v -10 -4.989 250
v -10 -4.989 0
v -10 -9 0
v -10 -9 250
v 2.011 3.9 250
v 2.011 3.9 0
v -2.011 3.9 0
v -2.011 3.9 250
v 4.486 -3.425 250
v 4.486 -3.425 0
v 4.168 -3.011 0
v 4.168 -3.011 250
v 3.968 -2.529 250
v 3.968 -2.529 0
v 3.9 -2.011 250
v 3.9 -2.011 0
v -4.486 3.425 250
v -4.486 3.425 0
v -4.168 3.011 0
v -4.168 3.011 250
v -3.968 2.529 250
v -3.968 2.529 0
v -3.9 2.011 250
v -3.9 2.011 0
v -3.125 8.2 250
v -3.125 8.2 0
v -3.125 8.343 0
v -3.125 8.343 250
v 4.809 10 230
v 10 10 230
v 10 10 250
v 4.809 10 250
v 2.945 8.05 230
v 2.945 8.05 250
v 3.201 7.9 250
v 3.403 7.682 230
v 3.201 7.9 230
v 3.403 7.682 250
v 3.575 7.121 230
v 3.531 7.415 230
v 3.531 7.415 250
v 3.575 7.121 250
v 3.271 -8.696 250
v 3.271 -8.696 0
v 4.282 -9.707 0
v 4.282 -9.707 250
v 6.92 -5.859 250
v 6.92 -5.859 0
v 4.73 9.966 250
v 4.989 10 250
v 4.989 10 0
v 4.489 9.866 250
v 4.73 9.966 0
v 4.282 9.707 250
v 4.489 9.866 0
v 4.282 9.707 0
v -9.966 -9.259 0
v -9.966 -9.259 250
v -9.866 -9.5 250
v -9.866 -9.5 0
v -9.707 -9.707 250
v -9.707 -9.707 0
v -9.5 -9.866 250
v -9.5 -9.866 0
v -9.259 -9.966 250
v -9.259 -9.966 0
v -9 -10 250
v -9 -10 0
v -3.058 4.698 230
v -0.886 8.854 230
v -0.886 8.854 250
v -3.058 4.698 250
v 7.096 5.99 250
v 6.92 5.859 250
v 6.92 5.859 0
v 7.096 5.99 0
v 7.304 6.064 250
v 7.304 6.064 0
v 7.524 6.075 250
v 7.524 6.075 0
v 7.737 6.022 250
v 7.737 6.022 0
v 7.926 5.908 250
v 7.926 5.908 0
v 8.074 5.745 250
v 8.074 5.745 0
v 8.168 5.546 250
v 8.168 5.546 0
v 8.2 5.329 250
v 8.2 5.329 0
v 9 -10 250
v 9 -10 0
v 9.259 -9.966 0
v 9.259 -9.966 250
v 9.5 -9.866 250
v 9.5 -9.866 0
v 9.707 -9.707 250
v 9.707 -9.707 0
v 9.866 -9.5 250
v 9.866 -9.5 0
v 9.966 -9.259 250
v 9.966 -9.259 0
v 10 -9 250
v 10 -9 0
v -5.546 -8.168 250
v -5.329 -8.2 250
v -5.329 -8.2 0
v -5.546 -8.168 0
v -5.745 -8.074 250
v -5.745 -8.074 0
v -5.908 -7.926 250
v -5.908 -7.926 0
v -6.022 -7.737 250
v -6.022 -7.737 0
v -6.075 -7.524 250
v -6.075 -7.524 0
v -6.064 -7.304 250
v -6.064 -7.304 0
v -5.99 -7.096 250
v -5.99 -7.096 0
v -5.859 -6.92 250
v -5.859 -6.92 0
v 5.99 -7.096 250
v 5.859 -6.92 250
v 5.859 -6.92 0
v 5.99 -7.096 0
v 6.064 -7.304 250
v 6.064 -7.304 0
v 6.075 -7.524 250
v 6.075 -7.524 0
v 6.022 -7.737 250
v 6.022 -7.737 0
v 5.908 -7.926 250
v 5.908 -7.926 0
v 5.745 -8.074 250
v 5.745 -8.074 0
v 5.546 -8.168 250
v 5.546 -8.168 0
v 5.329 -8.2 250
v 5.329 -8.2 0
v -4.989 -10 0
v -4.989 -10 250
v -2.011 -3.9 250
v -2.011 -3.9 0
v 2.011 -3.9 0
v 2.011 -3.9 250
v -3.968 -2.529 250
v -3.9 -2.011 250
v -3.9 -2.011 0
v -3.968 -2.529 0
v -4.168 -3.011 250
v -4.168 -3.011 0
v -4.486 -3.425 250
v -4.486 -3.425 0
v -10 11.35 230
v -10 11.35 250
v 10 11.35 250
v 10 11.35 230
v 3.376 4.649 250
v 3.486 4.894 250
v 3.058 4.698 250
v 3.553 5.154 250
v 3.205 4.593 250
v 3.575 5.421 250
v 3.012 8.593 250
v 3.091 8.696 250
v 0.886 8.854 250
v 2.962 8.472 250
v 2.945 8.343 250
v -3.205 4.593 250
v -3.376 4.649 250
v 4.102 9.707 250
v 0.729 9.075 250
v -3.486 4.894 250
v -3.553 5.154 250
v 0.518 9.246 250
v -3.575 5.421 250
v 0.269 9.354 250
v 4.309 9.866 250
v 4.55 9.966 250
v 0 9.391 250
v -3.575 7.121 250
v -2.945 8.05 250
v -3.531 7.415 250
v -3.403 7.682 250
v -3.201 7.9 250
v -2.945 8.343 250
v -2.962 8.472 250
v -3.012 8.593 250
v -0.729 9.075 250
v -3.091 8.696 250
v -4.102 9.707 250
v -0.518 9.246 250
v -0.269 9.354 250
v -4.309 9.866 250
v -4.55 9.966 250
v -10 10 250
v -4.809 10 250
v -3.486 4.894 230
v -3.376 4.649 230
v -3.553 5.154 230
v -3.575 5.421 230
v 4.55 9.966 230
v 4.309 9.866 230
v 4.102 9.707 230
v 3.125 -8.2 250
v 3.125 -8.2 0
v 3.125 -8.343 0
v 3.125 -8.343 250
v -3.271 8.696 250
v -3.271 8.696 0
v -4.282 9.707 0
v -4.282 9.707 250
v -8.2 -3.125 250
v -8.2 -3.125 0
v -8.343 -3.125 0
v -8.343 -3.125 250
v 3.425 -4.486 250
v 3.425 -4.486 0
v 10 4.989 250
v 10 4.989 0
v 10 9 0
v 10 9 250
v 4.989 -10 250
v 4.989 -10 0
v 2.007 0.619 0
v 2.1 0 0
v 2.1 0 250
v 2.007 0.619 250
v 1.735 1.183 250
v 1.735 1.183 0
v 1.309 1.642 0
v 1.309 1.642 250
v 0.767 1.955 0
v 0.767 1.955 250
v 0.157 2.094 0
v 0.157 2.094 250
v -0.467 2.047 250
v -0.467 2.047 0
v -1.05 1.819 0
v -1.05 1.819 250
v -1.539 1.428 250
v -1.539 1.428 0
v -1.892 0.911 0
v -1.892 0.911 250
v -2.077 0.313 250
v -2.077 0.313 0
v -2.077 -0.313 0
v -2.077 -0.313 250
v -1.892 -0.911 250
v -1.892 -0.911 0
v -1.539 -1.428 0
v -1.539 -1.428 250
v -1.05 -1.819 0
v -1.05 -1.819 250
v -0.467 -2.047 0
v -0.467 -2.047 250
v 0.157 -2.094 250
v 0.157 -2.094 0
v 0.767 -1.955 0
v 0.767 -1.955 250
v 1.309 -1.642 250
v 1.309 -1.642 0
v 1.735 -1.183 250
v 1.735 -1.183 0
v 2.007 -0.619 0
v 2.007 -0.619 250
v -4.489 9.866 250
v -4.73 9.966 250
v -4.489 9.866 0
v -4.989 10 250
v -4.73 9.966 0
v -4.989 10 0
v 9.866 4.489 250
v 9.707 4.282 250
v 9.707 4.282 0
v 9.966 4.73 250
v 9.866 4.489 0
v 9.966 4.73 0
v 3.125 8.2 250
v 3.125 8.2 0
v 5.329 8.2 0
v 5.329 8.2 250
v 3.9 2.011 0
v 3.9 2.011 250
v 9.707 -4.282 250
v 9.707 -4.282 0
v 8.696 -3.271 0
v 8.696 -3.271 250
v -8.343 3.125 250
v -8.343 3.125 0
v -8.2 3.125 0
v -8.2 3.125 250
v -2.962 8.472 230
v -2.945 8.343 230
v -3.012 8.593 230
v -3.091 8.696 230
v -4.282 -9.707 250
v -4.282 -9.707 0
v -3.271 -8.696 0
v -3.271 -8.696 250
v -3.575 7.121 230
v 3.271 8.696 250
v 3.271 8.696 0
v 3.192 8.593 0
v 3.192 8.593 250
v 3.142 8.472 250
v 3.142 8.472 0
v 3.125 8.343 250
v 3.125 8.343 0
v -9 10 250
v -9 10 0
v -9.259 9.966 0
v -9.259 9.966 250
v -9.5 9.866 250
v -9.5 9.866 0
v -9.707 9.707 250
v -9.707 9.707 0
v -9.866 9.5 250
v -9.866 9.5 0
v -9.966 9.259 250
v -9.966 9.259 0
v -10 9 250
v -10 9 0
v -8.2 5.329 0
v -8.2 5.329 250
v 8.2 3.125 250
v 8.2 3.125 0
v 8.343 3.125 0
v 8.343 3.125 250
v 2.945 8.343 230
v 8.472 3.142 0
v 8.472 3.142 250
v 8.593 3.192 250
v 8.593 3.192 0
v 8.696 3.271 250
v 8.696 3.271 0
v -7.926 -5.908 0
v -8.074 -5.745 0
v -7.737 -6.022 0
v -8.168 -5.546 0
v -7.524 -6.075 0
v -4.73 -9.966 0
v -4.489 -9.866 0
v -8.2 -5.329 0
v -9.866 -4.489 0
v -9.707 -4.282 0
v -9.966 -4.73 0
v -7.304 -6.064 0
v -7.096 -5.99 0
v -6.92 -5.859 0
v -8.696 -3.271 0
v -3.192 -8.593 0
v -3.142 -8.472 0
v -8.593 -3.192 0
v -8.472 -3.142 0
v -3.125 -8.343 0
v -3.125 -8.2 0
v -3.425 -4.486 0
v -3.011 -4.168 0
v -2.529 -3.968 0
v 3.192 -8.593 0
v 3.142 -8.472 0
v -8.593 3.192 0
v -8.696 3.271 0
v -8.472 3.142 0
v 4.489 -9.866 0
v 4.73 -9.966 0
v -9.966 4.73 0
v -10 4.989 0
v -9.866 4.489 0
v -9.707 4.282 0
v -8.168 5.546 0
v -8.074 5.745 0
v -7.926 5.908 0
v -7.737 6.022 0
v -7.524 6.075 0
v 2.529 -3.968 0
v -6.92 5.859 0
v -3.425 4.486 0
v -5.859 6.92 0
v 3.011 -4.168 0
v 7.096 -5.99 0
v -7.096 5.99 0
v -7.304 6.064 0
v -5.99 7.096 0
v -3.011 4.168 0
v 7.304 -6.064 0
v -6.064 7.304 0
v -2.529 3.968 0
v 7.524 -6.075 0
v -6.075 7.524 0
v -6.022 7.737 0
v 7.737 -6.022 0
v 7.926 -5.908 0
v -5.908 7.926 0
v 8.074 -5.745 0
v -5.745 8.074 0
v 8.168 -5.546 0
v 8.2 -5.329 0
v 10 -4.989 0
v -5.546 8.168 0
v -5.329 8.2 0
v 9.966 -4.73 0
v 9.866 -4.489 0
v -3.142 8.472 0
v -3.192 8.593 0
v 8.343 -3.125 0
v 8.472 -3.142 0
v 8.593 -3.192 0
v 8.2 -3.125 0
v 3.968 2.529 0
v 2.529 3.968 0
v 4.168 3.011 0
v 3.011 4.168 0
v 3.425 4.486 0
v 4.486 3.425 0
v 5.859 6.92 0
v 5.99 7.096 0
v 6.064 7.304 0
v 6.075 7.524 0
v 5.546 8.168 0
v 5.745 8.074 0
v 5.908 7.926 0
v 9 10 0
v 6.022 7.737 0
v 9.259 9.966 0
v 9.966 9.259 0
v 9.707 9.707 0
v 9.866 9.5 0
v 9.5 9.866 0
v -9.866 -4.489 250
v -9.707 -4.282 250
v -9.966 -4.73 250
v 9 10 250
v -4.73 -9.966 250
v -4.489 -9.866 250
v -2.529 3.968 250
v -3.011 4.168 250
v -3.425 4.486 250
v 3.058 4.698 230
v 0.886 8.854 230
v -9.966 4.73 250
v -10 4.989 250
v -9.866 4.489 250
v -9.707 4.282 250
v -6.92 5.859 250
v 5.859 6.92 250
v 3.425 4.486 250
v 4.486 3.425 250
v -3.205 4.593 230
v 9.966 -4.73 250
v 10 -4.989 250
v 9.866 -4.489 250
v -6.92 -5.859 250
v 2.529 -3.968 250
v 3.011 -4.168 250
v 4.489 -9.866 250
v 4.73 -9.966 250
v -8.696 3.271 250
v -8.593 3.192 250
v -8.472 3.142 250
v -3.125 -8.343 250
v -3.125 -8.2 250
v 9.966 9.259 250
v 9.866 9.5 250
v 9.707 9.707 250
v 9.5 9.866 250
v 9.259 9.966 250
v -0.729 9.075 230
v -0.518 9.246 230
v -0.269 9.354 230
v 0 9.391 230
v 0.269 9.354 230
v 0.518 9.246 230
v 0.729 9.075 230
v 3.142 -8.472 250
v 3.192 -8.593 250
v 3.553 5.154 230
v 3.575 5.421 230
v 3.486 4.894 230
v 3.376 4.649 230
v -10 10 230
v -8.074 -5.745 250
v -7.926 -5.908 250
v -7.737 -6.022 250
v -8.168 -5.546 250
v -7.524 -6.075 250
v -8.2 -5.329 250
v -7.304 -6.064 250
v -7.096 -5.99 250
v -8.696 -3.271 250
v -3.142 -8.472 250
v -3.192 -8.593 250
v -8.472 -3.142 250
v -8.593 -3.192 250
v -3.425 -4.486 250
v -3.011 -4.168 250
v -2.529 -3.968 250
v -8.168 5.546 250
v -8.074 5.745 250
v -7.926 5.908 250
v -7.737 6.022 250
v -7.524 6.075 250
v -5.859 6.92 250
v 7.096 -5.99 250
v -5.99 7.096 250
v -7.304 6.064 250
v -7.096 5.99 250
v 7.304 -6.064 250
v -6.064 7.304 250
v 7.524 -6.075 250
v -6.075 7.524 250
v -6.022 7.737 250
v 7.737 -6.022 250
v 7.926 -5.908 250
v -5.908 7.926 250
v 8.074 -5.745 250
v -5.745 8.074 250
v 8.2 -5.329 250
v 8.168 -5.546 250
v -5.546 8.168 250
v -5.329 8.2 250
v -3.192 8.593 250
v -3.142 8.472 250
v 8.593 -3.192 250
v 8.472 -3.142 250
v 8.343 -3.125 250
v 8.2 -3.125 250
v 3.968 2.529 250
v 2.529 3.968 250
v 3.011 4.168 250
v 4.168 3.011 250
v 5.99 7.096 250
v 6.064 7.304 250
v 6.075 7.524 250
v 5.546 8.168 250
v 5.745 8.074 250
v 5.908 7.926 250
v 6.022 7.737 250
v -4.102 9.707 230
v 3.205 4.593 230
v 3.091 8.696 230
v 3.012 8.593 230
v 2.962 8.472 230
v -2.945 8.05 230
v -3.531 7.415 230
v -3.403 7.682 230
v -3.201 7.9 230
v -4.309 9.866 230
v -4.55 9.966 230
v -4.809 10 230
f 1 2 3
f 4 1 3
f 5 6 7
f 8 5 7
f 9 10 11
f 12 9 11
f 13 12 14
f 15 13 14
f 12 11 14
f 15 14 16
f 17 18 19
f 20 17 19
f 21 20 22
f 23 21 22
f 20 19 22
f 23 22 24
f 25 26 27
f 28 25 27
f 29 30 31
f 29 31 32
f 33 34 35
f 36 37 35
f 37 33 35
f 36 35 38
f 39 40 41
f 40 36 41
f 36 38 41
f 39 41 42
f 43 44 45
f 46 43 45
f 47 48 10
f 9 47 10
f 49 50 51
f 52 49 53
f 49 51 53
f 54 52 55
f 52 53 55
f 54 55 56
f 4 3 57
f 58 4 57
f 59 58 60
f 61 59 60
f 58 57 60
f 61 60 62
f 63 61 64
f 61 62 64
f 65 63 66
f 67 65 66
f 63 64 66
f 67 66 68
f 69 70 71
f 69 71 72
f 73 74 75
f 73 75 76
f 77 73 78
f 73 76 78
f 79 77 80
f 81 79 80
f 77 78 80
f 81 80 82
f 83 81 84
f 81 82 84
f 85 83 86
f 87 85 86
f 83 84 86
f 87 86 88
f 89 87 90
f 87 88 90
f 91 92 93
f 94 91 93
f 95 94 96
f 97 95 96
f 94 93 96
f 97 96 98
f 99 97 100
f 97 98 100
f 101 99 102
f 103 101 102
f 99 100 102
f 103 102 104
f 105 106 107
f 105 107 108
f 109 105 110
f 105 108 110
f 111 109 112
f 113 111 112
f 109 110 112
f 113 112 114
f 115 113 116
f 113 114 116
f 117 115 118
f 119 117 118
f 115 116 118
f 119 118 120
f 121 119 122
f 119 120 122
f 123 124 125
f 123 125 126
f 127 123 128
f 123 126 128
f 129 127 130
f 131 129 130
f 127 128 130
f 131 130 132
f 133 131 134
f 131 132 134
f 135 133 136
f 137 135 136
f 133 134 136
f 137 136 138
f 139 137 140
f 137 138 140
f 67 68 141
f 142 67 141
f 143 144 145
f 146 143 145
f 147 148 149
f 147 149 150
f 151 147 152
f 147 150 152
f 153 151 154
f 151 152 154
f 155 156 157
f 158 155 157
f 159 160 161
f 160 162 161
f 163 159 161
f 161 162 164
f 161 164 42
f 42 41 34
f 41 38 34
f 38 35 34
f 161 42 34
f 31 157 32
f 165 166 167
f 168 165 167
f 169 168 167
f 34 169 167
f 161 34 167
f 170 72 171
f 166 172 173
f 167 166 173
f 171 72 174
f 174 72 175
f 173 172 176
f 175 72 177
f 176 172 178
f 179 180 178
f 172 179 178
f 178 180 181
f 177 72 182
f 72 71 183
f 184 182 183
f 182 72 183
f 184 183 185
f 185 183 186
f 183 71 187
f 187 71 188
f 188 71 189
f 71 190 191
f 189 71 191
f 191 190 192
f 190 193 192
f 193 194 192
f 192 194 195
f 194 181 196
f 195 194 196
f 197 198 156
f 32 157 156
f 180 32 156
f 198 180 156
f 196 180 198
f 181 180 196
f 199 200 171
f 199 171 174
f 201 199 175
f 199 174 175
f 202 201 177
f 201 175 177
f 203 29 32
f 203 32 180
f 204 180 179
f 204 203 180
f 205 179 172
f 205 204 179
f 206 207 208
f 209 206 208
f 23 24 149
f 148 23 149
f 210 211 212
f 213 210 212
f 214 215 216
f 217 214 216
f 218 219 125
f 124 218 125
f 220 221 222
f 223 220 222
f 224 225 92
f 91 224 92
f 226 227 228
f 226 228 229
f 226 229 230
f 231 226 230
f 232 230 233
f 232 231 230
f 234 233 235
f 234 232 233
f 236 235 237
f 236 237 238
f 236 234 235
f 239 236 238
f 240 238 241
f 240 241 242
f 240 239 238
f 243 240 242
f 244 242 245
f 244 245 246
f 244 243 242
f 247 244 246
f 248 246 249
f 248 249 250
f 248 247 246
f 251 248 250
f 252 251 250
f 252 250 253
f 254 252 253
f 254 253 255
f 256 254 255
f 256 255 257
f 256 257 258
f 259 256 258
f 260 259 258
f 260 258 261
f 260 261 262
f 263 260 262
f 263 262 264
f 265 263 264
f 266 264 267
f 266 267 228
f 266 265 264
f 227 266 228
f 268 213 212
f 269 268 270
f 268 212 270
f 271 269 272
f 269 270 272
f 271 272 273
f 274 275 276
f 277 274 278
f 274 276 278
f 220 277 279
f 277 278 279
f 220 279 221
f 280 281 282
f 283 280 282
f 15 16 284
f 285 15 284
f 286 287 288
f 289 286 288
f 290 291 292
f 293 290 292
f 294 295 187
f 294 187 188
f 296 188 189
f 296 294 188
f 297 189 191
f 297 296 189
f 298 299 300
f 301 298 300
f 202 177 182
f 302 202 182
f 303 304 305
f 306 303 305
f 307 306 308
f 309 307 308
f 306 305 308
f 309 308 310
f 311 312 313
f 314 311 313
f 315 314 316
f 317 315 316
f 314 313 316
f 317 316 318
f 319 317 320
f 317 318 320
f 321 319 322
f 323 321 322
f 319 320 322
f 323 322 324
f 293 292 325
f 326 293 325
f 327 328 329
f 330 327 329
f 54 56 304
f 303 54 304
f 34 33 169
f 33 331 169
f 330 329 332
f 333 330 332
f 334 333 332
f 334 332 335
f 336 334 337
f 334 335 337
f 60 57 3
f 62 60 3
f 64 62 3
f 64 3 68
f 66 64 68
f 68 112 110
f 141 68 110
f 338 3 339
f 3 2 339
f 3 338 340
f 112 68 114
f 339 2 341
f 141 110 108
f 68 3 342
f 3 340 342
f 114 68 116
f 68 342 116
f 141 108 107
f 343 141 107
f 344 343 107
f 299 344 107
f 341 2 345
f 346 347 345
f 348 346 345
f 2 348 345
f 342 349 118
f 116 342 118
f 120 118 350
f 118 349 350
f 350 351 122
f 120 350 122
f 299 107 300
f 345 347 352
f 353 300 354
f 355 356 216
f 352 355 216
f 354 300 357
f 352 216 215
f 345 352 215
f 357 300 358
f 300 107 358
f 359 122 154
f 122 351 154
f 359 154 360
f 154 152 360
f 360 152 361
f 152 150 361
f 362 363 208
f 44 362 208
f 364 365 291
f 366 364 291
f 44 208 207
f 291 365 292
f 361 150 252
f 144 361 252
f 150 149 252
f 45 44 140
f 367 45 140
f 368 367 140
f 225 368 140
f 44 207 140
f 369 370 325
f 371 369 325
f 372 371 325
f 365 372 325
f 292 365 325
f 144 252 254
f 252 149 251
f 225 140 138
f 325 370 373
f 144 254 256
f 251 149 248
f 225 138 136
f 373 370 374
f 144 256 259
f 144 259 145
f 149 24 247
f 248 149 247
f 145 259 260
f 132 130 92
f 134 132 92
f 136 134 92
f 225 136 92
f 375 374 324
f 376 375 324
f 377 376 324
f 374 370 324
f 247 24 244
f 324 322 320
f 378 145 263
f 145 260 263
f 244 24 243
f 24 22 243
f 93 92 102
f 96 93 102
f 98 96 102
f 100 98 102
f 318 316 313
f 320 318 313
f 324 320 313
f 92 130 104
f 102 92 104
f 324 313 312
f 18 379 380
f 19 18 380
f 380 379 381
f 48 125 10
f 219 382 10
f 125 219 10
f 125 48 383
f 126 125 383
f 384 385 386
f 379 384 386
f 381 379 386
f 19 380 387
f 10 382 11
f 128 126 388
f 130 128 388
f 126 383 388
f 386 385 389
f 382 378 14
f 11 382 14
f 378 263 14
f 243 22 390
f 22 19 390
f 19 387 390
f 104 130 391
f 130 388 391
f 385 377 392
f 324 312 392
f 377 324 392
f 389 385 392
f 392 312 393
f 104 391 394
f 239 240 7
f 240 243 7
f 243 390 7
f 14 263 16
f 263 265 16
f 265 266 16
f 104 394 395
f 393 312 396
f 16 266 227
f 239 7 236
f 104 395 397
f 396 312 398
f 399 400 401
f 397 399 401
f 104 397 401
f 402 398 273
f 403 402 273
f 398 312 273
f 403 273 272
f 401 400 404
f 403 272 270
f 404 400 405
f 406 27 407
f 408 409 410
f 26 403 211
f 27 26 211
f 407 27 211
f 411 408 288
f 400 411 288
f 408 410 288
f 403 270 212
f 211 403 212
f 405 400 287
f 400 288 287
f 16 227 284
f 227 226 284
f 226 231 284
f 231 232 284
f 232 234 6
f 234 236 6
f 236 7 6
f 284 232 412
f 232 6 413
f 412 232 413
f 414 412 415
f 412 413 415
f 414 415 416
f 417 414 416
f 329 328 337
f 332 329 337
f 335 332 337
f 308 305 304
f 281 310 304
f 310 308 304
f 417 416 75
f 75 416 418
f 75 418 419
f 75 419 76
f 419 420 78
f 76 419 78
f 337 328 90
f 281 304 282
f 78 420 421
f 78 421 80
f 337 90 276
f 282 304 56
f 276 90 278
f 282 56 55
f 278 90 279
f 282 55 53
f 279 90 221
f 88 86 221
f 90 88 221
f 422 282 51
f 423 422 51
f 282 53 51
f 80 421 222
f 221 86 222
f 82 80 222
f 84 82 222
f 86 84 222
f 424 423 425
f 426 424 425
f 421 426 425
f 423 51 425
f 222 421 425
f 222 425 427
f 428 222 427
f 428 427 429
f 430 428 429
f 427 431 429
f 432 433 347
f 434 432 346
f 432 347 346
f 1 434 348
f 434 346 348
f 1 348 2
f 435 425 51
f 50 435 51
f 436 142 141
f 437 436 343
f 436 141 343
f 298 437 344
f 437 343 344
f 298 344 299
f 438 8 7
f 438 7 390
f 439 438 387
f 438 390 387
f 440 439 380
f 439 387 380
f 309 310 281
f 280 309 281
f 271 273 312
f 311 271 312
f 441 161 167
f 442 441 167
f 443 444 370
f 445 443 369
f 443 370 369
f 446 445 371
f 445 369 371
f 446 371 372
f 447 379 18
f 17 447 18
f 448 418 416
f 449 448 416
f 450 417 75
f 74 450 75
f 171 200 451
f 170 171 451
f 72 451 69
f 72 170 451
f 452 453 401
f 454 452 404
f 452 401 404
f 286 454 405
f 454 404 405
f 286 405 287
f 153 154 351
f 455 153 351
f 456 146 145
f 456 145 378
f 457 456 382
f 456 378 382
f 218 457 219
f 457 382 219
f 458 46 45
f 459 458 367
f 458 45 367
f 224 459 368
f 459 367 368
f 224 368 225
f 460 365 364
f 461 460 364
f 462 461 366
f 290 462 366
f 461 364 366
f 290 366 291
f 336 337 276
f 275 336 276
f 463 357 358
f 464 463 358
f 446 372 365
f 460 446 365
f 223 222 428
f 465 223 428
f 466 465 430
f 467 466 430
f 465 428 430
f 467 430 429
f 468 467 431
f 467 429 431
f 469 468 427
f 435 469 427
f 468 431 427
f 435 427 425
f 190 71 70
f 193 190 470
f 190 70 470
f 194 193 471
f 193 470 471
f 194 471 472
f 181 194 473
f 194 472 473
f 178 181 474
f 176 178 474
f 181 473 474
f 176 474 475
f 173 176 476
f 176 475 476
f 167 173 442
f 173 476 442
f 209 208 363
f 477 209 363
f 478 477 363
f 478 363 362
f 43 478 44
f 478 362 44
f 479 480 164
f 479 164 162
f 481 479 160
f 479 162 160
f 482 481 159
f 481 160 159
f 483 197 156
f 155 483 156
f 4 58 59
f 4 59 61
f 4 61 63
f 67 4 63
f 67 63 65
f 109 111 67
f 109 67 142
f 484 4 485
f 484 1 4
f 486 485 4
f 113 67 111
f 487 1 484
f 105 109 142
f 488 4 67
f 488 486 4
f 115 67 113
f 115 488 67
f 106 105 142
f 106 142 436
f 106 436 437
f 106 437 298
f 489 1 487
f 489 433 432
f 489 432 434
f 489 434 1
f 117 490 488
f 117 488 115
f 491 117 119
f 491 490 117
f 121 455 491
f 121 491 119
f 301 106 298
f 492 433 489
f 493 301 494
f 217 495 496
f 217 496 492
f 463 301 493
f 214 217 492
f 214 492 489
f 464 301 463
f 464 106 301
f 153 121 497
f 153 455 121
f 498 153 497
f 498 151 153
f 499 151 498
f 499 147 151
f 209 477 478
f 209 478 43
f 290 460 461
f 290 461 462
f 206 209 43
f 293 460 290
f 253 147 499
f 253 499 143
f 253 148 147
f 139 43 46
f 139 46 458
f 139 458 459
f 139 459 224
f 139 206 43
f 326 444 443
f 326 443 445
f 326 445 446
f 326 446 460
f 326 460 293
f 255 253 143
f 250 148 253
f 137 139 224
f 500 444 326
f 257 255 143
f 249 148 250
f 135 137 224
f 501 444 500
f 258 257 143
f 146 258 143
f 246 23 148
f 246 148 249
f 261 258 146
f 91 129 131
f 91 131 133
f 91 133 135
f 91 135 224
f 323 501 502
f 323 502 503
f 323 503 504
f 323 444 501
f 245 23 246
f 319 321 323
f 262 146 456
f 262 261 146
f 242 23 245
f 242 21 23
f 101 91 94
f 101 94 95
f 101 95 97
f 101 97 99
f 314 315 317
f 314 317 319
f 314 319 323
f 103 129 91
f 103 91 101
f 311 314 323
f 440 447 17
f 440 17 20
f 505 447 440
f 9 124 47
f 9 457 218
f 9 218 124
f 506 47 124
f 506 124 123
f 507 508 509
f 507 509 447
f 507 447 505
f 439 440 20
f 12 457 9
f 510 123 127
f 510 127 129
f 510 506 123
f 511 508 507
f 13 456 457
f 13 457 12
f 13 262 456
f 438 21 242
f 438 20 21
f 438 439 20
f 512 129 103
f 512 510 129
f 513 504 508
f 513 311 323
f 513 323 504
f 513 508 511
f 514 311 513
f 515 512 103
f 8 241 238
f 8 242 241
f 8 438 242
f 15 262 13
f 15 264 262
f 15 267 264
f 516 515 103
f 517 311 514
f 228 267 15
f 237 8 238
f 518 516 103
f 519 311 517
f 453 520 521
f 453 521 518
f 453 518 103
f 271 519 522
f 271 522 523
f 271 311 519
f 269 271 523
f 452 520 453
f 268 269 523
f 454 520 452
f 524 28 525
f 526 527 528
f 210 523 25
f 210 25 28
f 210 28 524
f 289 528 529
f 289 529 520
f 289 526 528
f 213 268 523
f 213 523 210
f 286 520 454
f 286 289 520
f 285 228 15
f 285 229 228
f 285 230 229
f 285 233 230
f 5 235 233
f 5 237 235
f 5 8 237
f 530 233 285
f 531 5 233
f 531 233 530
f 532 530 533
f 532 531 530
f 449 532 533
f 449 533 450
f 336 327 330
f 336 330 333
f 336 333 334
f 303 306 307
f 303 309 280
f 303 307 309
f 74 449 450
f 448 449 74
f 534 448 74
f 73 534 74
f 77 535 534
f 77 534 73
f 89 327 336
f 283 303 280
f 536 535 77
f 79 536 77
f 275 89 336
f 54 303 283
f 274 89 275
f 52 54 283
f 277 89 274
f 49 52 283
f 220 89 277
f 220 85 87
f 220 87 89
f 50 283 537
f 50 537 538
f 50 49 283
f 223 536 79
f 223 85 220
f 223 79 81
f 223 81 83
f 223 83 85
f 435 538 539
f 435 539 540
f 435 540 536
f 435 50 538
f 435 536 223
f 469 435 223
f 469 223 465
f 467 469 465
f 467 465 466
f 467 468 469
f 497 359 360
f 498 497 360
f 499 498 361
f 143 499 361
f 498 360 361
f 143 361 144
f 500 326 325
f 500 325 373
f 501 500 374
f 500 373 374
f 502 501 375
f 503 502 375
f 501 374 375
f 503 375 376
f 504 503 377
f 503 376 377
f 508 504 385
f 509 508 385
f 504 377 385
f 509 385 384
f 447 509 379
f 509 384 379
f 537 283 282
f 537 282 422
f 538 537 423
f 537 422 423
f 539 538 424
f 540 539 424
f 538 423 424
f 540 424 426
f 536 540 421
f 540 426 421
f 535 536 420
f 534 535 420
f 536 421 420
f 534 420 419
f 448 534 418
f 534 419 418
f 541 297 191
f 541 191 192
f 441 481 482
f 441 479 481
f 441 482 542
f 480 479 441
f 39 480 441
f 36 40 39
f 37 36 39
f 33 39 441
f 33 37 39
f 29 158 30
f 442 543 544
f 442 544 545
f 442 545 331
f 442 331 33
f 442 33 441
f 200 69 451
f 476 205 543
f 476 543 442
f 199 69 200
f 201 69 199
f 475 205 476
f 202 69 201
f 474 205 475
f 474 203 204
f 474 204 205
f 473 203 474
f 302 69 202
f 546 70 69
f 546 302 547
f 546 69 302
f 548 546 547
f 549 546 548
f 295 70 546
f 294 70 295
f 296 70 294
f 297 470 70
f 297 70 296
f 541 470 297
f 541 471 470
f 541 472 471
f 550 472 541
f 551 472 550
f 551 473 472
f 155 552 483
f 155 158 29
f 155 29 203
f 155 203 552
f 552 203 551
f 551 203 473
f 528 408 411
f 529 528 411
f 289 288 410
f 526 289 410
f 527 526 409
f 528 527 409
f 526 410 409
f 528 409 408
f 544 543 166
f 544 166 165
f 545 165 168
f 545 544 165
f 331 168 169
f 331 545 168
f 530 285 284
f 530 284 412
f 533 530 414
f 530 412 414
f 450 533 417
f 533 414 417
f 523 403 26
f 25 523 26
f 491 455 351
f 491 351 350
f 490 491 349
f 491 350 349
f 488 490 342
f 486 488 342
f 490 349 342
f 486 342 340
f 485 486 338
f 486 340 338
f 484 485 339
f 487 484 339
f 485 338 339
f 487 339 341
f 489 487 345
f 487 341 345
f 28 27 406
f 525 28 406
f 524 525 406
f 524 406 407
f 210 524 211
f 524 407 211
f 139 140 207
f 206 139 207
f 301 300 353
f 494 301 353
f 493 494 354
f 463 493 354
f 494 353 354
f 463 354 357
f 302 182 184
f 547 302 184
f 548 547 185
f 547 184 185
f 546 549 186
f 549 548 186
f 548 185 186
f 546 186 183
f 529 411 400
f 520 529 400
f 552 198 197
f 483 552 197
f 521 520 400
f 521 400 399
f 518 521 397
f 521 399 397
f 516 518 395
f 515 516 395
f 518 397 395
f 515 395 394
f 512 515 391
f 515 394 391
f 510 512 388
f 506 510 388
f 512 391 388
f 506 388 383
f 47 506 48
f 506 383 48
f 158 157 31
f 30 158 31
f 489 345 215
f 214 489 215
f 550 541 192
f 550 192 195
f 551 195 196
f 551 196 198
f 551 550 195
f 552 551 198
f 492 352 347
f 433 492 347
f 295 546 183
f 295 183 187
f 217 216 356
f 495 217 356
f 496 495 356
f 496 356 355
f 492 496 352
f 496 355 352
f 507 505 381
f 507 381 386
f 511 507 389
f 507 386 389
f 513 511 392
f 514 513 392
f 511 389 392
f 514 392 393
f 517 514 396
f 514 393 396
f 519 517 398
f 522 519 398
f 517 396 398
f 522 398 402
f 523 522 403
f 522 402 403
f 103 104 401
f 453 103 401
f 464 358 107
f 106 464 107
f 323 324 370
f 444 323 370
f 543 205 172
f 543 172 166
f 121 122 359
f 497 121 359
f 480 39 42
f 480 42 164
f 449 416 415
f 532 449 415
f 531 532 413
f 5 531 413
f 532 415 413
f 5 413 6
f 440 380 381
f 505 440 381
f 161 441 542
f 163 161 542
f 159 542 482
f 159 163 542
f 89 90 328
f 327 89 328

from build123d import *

# Parameters (mm, degrees)
SKETCH_1_R          = 2.1
EXTRUDE_1_DEPTH     = 250
BOSS_EXTRUDE1_DEPTH = 20
MOVE_START          = 230
MOVE_FACE1_DEPTH    = 20
MOVE_FACE2_DEPTH    = 20
MOVE_FACE3_BY       = 0.15
MOVE_FACE3_2_BY     = 0.15
MOVE_FACE3_3_BY     = 0.15
MOVE_FACE3_4_BY     = 0.15
MOVE_FACE3_5_BY     = 0.15
MOVE_FACE3_6_BY     = 0.15
MOVE_FACE3_7_BY     = 0.15
MOVE_FACE3_8_BY     = 0.15
FILLET1_R           = 1
FILLET2_R           = 0.2
FILLET3_R           = 1.6
FILLET4_R           = 1


with BuildPart() as part:
    # Эскиз1 → Бобышка-Вытянуть1 (new body)
    with BuildSketch(Plane.XY):
        with BuildLine():
            Line((3.125, 8.342893219), (3.125, 8.2))
            Line((3.125, 8.2), (5.328679656, 8.2))
            ThreePointArc((5.328679656, 8.2), (6.021589306, 7.737012574), (5.859009742, 6.919669914))
            Line((5.859009742, 6.919669914), (3.425126266, 4.485786438))
            ThreePointArc((3.425126266, 4.485786438), (2.776279568, 4.052240935), (2.010912703, 3.9))
            Line((2.010912703, 3.9), (-2.010912703, 3.9))
            ThreePointArc((-2.010912703, 3.9), (-2.776279568, 4.052240935), (-3.425126266, 4.485786438))
            Line((-3.425126266, 4.485786438), (-5.859009742, 6.919669914))
            ThreePointArc((-5.859009742, 6.919669914), (-6.021589306, 7.737012574), (-5.328679656, 8.2))
            Line((-5.328679656, 8.2), (-3.125, 8.2))
            Line((-3.125, 8.2), (-3.125, 8.342893219))
            ThreePointArc((-3.125, 8.342893219), (-3.163060234, 8.534234935), (-3.271446609, 8.696446609))
            Line((-3.271446609, 8.696446609), (-4.282106781, 9.707106781))
            ThreePointArc((-4.282106781, 9.707106781), (-4.60653013, 9.923879533), (-4.989213562, 10))
            Line((-4.989213562, 10), (-9, 10))
            ThreePointArc((-9, 10), (-9.707106781, 9.707106781), (-10, 9))
            Line((-10, 9), (-10, 4.989213562))
            ThreePointArc((-10, 4.989213562), (-9.923879533, 4.60653013), (-9.707106781, 4.282106781))
            Line((-9.707106781, 4.282106781), (-8.696446609, 3.271446609))
            ThreePointArc((-8.696446609, 3.271446609), (-8.534234935, 3.163060234), (-8.342893219, 3.125))
            Line((-8.342893219, 3.125), (-8.2, 3.125))
            Line((-8.2, 3.125), (-8.2, 5.328679656))
            ThreePointArc((-8.2, 5.328679656), (-7.737012574, 6.021589306), (-6.919669914, 5.859009742))
            Line((-6.919669914, 5.859009742), (-4.485786438, 3.425126266))
            ThreePointArc((-4.485786438, 3.425126266), (-4.052240935, 2.776279568), (-3.9, 2.010912703))
            Line((-3.9, 2.010912703), (-3.9, -2.010912703))
            ThreePointArc((-3.9, -2.010912703), (-4.052240935, -2.776279568), (-4.485786438, -3.425126266))
            Line((-4.485786438, -3.425126266), (-6.919669914, -5.859009742))
            ThreePointArc((-6.919669914, -5.859009742), (-7.737012574, -6.021589306), (-8.2, -5.328679656))
            Line((-8.2, -5.328679656), (-8.2, -3.125))
            Line((-8.2, -3.125), (-8.342893219, -3.125))
            ThreePointArc((-8.342893219, -3.125), (-8.534234935, -3.163060234), (-8.696446609, -3.271446609))
            Line((-8.696446609, -3.271446609), (-9.707106781, -4.282106781))
            ThreePointArc((-9.707106781, -4.282106781), (-9.923879533, -4.60653013), (-10, -4.989213562))
            Line((-10, -4.989213562), (-10, -9))
            ThreePointArc((-10, -9), (-9.707106781, -9.707106781), (-9, -10))
            Line((-9, -10), (-4.989213562, -10))
            ThreePointArc((-4.989213562, -10), (-4.60653013, -9.923879533), (-4.282106781, -9.707106781))
            Line((-4.282106781, -9.707106781), (-3.271446609, -8.696446609))
            ThreePointArc((-3.271446609, -8.696446609), (-3.163060234, -8.534234935), (-3.125, -8.342893219))
            Line((-3.125, -8.342893219), (-3.125, -8.2))
            Line((-3.125, -8.2), (-5.328679656, -8.2))
            ThreePointArc((-5.328679656, -8.2), (-6.021589306, -7.737012574), (-5.859009742, -6.919669914))
            Line((-5.859009742, -6.919669914), (-3.425126266, -4.485786438))
            ThreePointArc((-3.425126266, -4.485786438), (-2.776279568, -4.052240935), (-2.010912703, -3.9))
            Line((-2.010912703, -3.9), (2.010912703, -3.9))
            ThreePointArc((2.010912703, -3.9), (2.776279568, -4.052240935), (3.425126266, -4.485786438))
            Line((3.425126266, -4.485786438), (5.859009742, -6.919669914))
            ThreePointArc((5.859009742, -6.919669914), (6.021589306, -7.737012574), (5.328679656, -8.2))
            Line((5.328679656, -8.2), (3.125, -8.2))
            Line((3.125, -8.2), (3.125, -8.342893219))
            ThreePointArc((3.125, -8.342893219), (3.163060234, -8.534234935), (3.271446609, -8.696446609))
            Line((3.271446609, -8.696446609), (4.282106781, -9.707106781))
            ThreePointArc((4.282106781, -9.707106781), (4.60653013, -9.923879533), (4.989213562, -10))
            Line((4.989213562, -10), (9, -10))
            ThreePointArc((9, -10), (9.707106781, -9.707106781), (10, -9))
            Line((10, -9), (10, -4.989213562))
            ThreePointArc((10, -4.989213562), (9.923879533, -4.60653013), (9.707106781, -4.282106781))
            Line((9.707106781, -4.282106781), (8.696446609, -3.271446609))
            ThreePointArc((8.696446609, -3.271446609), (8.534234935, -3.163060234), (8.342893219, -3.125))
            Line((8.342893219, -3.125), (8.2, -3.125))
            Line((8.2, -3.125), (8.2, -5.328679656))
            ThreePointArc((8.2, -5.328679656), (7.737012574, -6.021589306), (6.919669914, -5.859009742))
            Line((6.919669914, -5.859009742), (4.485786438, -3.425126266))
            ThreePointArc((4.485786438, -3.425126266), (4.052240935, -2.776279568), (3.9, -2.010912703))
            Line((3.9, -2.010912703), (3.9, 2.010912703))
            ThreePointArc((3.9, 2.010912703), (4.052240935, 2.776279568), (4.485786438, 3.425126266))
            Line((4.485786438, 3.425126266), (6.919669914, 5.859009742))
            ThreePointArc((6.919669914, 5.859009742), (7.737012574, 6.021589306), (8.2, 5.328679656))
            Line((8.2, 5.328679656), (8.2, 3.125))
            Line((8.2, 3.125), (8.342893219, 3.125))
            ThreePointArc((8.342893219, 3.125), (8.534234935, 3.163060234), (8.696446609, 3.271446609))
            Line((8.696446609, 3.271446609), (9.707106781, 4.282106781))
            ThreePointArc((9.707106781, 4.282106781), (9.923879533, 4.60653013), (10, 4.989213562))
            Line((10, 4.989213562), (10, 9))
            ThreePointArc((10, 9), (9.707106781, 9.707106781), (9, 10))
            Line((9, 10), (4.989213562, 10))
            ThreePointArc((4.989213562, 10), (4.60653013, 9.923879533), (4.282106781, 9.707106781))
            Line((4.282106781, 9.707106781), (3.271446609, 8.696446609))
            ThreePointArc((3.271446609, 8.696446609), (3.163060234, 8.534234935), (3.125, 8.342893219))
        make_face()
        Circle(SKETCH_1_R, mode=Mode.SUBTRACT)
    extrude(amount=EXTRUDE_1_DEPTH)


with BuildPart() as body_2:
    # Sketch1 → Boss-Extrude1 (new body)
    with BuildSketch(Plane.XY.offset(250)):
        with BuildLine():
            Line((-9, 10), (-10, 10))
            Line((-10, 10), (-10, 11.35))
            Line((-10, 11.35), (10, 11.35))
            Line((10, 11.35), (10, 10))
            Line((10, 10), (9, 10))
            Line((9, 10), (4.989213562, 10))
            ThreePointArc((4.989213562, 10), (4.60653013, 9.923879533), (4.282106781, 9.707106781))
            Line((4.282106781, 9.707106781), (3.271446609, 8.696446609))
            ThreePointArc((3.271446609, 8.696446609), (3.163060234, 8.534234935), (3.125, 8.342893219))
            Line((3.125, 8.342893219), (3.125, 8.2))
            Line((3.125, 8.2), (3.725, 8.2))
            Line((3.725, 8.2), (3.725, 4.785660172))
            Line((3.725, 4.785660172), (3.425126266, 4.485786438))
            ThreePointArc((3.425126266, 4.485786438), (3.33984567, 4.405363867), (3.25, 4.330075584))
            Line((3.25, 4.330075584), (0, 10.55))
            Line((0, 10.55), (-3.25, 4.330075584))
            ThreePointArc((-3.25, 4.330075584), (-3.33984567, 4.405363867), (-3.425126266, 4.485786438))
            Line((-3.425126266, 4.485786438), (-3.725, 4.785660172))
            Line((-3.725, 4.785660172), (-3.725, 8.2))
            Line((-3.725, 8.2), (-3.125, 8.2))
            Line((-3.125, 8.2), (-3.125, 8.342893219))
            ThreePointArc((-3.125, 8.342893219), (-3.163060234, 8.534234935), (-3.271446609, 8.696446609))
            Line((-3.271446609, 8.696446609), (-4.282106781, 9.707106781))
            ThreePointArc((-4.282106781, 9.707106781), (-4.60653013, 9.923879533), (-4.989213562, 10))
            Line((-4.989213562, 10), (-9, 10))
        make_face()
    extrude(amount=-BOSS_EXTRUDE1_DEPTH)

    # Move Face1: read off the stored shape, not the designer's step
    # Move Face1 outline → Move Face1 (cut)
    with BuildSketch(Plane.XY.offset(MOVE_START)):
        with BuildLine():
            Line((-3.125, 8.2), (-2.945, 8.2))
            Line((-2.945, 8.2), (-2.945, 8.342893219))
            ThreePointArc((-2.945, 8.342893219), (-2.983060234, 8.534234935), (-3.091446609, 8.696446609))
            Line((-3.091446609, 8.696446609), (-4.102106781, 9.707106781))
            ThreePointArc((-4.102106781, 9.707106781), (-4.42653013, 9.923879533), (-4.809213562, 10))
            Line((-4.809213562, 10), (-4.989213562, 10))
            ThreePointArc((-4.989213562, 10), (-4.60653013, 9.923879533), (-4.282106781, 9.707106781))
            Line((-4.282106781, 9.707106781), (-3.271446609, 8.696446609))
            ThreePointArc((-3.271446609, 8.696446609), (-3.163060234, 8.534234935), (-3.125, 8.342893219))
            Line((-3.125, 8.342893219), (-3.125, 8.2))
        make_face()
    extrude(amount=MOVE_FACE1_DEPTH, mode=Mode.SUBTRACT)

    # Move Face2: read off the stored shape, not the designer's step
    # Move Face2 outline → Move Face2 (cut)
    with BuildSketch(Plane.XY.offset(MOVE_START)):
        with BuildLine():
            Line((4.989213562, 10), (4.809213562, 10))
            ThreePointArc((4.809213562, 10), (4.42653013, 9.923879533), (4.102106781, 9.707106781))
            Line((4.102106781, 9.707106781), (3.091446609, 8.696446609))
            ThreePointArc((3.091446609, 8.696446609), (2.983060234, 8.534234935), (2.945, 8.342893219))
            Line((2.945, 8.342893219), (2.945, 8.2))
            Line((2.945, 8.2), (3.125, 8.2))
            Line((3.125, 8.2), (3.125, 8.342893219))
            ThreePointArc((3.125, 8.342893219), (3.163060234, 8.534234935), (3.271446609, 8.696446609))
            Line((3.271446609, 8.696446609), (4.282106781, 9.707106781))
            ThreePointArc((4.282106781, 9.707106781), (4.60653013, 9.923879533), (4.989213562, 10))
        make_face()
    extrude(amount=MOVE_FACE2_DEPTH, mode=Mode.SUBTRACT)

    # Move Face3: a face moved inward by 0.15
    extrude(body_2.faces().sort_by_distance((3.335, 8.2, 240))[0], amount=MOVE_FACE3_BY, dir=(0, -1, 0), mode=Mode.SUBTRACT)

    # Move Face3 2: a face moved inward by 0.15
    extrude(body_2.faces().sort_by_distance((-3.335, 8.2, 240))[0], amount=MOVE_FACE3_2_BY, dir=(0, -1, 0), mode=Mode.SUBTRACT)

    # Move Face3 3: a face moved inward by 0.15
    extrude(body_2.faces().sort_by_distance((3.725, 6.492830086, 240))[0], amount=MOVE_FACE3_3_BY, dir=(-1, 0, 0), mode=Mode.SUBTRACT)

    # Move Face3 4: a curved face moved inward by 0.15
    add(Solid.thicken(body_2.faces().sort_by_distance((3.33984567, 4.405363867, 240))[0], -MOVE_FACE3_4_BY), mode=Mode.SUBTRACT)

    # Move Face3 5: a face moved inward by 0.15
    extrude(body_2.faces().sort_by_distance((3.575063133, 4.635723305, 240))[0], amount=MOVE_FACE3_5_BY, dir=(-0.707106781, 0.707106781, 0), mode=Mode.SUBTRACT)

    # Move Face3 6: a curved face moved inward by 0.15
    add(Solid.thicken(body_2.faces().sort_by_distance((-3.33984567, 4.405363867, 240))[0], -MOVE_FACE3_6_BY), mode=Mode.SUBTRACT)

    # Move Face3 7: a face moved inward by 0.15
    extrude(body_2.faces().sort_by_distance((-3.575063133, 4.635723305, 240))[0], amount=MOVE_FACE3_7_BY, dir=(0.707106781, 0.707106781, 0), mode=Mode.SUBTRACT)

    # Move Face3 8: a face moved inward by 0.15
    extrude(body_2.faces().sort_by_distance((-3.725, 6.492830086, 240))[0], amount=MOVE_FACE3_8_BY, dir=(1, 0, 0), mode=Mode.SUBTRACT)

    # Fillet1
    # the kernel refuses this fillet: 1 mm, written as the material it takes off along each edge
    with BuildSketch(Plane(origin=(3.575, 8.05, 252.322579385), x_dir=(0, -1, 0), z_dir=(0, 0, -1))) as fillet1_piece_1:
        with BuildLine():
            CenterArc((0.929031754, 1), FILLET1_R, 201.715617283, 68.284382717)
            Line((0, 0.63), (-0.018580635, 0.6226))
            ThreePointArc((-0.018580635, 0.6226), (-0.02, 0.315), (-0.02, 0))
            Line((-0.02, 0), (0, -0.02))
            Line((0, -0.02), (0.929031754, -0.02))
            Line((0.929031754, -0.02), (0.929031754, 0))
        make_face()
    extrude(amount=24.64515877, mode=Mode.SUBTRACT)
    with BuildSketch(Plane(origin=(-3.575, 8.05, 252.322579385), x_dir=(1, 0, 0), z_dir=(0, 0, -1))) as fillet1_piece_2:
        with BuildLine():
            CenterArc((1, 0.929031754), FILLET1_R, 180, 68.284382717)
            Line((0, 0.929031754), (-0.02, 0.929031754))
            Line((-0.02, 0.929031754), (-0.02, 0))
            Line((-0.02, 0), (0, -0.02))
            ThreePointArc((0, -0.02), (0.315, -0.02), (0.6226, -0.018580635))
            Line((0.6226, -0.018580635), (0.63, 0))
        make_face()
    extrude(amount=24.64515877, mode=Mode.SUBTRACT)

    # Fillet2
    fillet2_edges = [body_2.edges().sort_by_distance(p)[0] for p in [
        (3.179203519, 4.46556751, 240),
        (-3.179203519, 4.46556751, 240),
    ]]
    fillet(fillet2_edges, radius=FILLET2_R)

    # Fillet3
    # the kernel refuses this fillet: 1.6 mm, written as the material it takes off along each edge
    with BuildSketch(Plane(origin=(3.575, 4.847792206, 251.433598548), x_dir=(-0.7071067812067597, -0.7071067811663352, 0), z_dir=(0, 0, -1))) as fillet3_piece_1:
        with BuildLine():
            CenterArc((0.725887948, 1.536853752), FILLET3_R, 224.999999998, 28.849342749)
            Line((-0.405482902, 0.405482902), (0, 0))
            Line((0, 0), (0.280825542, 0))
        make_face()
    extrude(amount=22.867197096, mode=Mode.SUBTRACT)
    with BuildSketch(Plane(origin=(-3.575, 4.847792206, 251.433598548), x_dir=(0.7071067812067448, -0.7071067811663502, 0), z_dir=(0, 0, -1))) as fillet3_piece_2:
        with BuildLine():
            CenterArc((0.725887948, -1.536853752), FILLET3_R, 106.150657252, 28.849342749)
            Line((-0.405482902, -0.405482902), (0, 0))
            Line((0, 0), (0.280825542, 0))
        make_face()
    extrude(amount=22.867197096, mode=Mode.SUBTRACT)

    # Fillet4
    fillet4_edges = [body_2.edges().sort_by_distance(p)[0] for p in [
        (0, 10.55, 240),
    ]]
    fillet(fillet4_edges, radius=FILLET4_R)


solid = Compound([part.part, body_2.part])
